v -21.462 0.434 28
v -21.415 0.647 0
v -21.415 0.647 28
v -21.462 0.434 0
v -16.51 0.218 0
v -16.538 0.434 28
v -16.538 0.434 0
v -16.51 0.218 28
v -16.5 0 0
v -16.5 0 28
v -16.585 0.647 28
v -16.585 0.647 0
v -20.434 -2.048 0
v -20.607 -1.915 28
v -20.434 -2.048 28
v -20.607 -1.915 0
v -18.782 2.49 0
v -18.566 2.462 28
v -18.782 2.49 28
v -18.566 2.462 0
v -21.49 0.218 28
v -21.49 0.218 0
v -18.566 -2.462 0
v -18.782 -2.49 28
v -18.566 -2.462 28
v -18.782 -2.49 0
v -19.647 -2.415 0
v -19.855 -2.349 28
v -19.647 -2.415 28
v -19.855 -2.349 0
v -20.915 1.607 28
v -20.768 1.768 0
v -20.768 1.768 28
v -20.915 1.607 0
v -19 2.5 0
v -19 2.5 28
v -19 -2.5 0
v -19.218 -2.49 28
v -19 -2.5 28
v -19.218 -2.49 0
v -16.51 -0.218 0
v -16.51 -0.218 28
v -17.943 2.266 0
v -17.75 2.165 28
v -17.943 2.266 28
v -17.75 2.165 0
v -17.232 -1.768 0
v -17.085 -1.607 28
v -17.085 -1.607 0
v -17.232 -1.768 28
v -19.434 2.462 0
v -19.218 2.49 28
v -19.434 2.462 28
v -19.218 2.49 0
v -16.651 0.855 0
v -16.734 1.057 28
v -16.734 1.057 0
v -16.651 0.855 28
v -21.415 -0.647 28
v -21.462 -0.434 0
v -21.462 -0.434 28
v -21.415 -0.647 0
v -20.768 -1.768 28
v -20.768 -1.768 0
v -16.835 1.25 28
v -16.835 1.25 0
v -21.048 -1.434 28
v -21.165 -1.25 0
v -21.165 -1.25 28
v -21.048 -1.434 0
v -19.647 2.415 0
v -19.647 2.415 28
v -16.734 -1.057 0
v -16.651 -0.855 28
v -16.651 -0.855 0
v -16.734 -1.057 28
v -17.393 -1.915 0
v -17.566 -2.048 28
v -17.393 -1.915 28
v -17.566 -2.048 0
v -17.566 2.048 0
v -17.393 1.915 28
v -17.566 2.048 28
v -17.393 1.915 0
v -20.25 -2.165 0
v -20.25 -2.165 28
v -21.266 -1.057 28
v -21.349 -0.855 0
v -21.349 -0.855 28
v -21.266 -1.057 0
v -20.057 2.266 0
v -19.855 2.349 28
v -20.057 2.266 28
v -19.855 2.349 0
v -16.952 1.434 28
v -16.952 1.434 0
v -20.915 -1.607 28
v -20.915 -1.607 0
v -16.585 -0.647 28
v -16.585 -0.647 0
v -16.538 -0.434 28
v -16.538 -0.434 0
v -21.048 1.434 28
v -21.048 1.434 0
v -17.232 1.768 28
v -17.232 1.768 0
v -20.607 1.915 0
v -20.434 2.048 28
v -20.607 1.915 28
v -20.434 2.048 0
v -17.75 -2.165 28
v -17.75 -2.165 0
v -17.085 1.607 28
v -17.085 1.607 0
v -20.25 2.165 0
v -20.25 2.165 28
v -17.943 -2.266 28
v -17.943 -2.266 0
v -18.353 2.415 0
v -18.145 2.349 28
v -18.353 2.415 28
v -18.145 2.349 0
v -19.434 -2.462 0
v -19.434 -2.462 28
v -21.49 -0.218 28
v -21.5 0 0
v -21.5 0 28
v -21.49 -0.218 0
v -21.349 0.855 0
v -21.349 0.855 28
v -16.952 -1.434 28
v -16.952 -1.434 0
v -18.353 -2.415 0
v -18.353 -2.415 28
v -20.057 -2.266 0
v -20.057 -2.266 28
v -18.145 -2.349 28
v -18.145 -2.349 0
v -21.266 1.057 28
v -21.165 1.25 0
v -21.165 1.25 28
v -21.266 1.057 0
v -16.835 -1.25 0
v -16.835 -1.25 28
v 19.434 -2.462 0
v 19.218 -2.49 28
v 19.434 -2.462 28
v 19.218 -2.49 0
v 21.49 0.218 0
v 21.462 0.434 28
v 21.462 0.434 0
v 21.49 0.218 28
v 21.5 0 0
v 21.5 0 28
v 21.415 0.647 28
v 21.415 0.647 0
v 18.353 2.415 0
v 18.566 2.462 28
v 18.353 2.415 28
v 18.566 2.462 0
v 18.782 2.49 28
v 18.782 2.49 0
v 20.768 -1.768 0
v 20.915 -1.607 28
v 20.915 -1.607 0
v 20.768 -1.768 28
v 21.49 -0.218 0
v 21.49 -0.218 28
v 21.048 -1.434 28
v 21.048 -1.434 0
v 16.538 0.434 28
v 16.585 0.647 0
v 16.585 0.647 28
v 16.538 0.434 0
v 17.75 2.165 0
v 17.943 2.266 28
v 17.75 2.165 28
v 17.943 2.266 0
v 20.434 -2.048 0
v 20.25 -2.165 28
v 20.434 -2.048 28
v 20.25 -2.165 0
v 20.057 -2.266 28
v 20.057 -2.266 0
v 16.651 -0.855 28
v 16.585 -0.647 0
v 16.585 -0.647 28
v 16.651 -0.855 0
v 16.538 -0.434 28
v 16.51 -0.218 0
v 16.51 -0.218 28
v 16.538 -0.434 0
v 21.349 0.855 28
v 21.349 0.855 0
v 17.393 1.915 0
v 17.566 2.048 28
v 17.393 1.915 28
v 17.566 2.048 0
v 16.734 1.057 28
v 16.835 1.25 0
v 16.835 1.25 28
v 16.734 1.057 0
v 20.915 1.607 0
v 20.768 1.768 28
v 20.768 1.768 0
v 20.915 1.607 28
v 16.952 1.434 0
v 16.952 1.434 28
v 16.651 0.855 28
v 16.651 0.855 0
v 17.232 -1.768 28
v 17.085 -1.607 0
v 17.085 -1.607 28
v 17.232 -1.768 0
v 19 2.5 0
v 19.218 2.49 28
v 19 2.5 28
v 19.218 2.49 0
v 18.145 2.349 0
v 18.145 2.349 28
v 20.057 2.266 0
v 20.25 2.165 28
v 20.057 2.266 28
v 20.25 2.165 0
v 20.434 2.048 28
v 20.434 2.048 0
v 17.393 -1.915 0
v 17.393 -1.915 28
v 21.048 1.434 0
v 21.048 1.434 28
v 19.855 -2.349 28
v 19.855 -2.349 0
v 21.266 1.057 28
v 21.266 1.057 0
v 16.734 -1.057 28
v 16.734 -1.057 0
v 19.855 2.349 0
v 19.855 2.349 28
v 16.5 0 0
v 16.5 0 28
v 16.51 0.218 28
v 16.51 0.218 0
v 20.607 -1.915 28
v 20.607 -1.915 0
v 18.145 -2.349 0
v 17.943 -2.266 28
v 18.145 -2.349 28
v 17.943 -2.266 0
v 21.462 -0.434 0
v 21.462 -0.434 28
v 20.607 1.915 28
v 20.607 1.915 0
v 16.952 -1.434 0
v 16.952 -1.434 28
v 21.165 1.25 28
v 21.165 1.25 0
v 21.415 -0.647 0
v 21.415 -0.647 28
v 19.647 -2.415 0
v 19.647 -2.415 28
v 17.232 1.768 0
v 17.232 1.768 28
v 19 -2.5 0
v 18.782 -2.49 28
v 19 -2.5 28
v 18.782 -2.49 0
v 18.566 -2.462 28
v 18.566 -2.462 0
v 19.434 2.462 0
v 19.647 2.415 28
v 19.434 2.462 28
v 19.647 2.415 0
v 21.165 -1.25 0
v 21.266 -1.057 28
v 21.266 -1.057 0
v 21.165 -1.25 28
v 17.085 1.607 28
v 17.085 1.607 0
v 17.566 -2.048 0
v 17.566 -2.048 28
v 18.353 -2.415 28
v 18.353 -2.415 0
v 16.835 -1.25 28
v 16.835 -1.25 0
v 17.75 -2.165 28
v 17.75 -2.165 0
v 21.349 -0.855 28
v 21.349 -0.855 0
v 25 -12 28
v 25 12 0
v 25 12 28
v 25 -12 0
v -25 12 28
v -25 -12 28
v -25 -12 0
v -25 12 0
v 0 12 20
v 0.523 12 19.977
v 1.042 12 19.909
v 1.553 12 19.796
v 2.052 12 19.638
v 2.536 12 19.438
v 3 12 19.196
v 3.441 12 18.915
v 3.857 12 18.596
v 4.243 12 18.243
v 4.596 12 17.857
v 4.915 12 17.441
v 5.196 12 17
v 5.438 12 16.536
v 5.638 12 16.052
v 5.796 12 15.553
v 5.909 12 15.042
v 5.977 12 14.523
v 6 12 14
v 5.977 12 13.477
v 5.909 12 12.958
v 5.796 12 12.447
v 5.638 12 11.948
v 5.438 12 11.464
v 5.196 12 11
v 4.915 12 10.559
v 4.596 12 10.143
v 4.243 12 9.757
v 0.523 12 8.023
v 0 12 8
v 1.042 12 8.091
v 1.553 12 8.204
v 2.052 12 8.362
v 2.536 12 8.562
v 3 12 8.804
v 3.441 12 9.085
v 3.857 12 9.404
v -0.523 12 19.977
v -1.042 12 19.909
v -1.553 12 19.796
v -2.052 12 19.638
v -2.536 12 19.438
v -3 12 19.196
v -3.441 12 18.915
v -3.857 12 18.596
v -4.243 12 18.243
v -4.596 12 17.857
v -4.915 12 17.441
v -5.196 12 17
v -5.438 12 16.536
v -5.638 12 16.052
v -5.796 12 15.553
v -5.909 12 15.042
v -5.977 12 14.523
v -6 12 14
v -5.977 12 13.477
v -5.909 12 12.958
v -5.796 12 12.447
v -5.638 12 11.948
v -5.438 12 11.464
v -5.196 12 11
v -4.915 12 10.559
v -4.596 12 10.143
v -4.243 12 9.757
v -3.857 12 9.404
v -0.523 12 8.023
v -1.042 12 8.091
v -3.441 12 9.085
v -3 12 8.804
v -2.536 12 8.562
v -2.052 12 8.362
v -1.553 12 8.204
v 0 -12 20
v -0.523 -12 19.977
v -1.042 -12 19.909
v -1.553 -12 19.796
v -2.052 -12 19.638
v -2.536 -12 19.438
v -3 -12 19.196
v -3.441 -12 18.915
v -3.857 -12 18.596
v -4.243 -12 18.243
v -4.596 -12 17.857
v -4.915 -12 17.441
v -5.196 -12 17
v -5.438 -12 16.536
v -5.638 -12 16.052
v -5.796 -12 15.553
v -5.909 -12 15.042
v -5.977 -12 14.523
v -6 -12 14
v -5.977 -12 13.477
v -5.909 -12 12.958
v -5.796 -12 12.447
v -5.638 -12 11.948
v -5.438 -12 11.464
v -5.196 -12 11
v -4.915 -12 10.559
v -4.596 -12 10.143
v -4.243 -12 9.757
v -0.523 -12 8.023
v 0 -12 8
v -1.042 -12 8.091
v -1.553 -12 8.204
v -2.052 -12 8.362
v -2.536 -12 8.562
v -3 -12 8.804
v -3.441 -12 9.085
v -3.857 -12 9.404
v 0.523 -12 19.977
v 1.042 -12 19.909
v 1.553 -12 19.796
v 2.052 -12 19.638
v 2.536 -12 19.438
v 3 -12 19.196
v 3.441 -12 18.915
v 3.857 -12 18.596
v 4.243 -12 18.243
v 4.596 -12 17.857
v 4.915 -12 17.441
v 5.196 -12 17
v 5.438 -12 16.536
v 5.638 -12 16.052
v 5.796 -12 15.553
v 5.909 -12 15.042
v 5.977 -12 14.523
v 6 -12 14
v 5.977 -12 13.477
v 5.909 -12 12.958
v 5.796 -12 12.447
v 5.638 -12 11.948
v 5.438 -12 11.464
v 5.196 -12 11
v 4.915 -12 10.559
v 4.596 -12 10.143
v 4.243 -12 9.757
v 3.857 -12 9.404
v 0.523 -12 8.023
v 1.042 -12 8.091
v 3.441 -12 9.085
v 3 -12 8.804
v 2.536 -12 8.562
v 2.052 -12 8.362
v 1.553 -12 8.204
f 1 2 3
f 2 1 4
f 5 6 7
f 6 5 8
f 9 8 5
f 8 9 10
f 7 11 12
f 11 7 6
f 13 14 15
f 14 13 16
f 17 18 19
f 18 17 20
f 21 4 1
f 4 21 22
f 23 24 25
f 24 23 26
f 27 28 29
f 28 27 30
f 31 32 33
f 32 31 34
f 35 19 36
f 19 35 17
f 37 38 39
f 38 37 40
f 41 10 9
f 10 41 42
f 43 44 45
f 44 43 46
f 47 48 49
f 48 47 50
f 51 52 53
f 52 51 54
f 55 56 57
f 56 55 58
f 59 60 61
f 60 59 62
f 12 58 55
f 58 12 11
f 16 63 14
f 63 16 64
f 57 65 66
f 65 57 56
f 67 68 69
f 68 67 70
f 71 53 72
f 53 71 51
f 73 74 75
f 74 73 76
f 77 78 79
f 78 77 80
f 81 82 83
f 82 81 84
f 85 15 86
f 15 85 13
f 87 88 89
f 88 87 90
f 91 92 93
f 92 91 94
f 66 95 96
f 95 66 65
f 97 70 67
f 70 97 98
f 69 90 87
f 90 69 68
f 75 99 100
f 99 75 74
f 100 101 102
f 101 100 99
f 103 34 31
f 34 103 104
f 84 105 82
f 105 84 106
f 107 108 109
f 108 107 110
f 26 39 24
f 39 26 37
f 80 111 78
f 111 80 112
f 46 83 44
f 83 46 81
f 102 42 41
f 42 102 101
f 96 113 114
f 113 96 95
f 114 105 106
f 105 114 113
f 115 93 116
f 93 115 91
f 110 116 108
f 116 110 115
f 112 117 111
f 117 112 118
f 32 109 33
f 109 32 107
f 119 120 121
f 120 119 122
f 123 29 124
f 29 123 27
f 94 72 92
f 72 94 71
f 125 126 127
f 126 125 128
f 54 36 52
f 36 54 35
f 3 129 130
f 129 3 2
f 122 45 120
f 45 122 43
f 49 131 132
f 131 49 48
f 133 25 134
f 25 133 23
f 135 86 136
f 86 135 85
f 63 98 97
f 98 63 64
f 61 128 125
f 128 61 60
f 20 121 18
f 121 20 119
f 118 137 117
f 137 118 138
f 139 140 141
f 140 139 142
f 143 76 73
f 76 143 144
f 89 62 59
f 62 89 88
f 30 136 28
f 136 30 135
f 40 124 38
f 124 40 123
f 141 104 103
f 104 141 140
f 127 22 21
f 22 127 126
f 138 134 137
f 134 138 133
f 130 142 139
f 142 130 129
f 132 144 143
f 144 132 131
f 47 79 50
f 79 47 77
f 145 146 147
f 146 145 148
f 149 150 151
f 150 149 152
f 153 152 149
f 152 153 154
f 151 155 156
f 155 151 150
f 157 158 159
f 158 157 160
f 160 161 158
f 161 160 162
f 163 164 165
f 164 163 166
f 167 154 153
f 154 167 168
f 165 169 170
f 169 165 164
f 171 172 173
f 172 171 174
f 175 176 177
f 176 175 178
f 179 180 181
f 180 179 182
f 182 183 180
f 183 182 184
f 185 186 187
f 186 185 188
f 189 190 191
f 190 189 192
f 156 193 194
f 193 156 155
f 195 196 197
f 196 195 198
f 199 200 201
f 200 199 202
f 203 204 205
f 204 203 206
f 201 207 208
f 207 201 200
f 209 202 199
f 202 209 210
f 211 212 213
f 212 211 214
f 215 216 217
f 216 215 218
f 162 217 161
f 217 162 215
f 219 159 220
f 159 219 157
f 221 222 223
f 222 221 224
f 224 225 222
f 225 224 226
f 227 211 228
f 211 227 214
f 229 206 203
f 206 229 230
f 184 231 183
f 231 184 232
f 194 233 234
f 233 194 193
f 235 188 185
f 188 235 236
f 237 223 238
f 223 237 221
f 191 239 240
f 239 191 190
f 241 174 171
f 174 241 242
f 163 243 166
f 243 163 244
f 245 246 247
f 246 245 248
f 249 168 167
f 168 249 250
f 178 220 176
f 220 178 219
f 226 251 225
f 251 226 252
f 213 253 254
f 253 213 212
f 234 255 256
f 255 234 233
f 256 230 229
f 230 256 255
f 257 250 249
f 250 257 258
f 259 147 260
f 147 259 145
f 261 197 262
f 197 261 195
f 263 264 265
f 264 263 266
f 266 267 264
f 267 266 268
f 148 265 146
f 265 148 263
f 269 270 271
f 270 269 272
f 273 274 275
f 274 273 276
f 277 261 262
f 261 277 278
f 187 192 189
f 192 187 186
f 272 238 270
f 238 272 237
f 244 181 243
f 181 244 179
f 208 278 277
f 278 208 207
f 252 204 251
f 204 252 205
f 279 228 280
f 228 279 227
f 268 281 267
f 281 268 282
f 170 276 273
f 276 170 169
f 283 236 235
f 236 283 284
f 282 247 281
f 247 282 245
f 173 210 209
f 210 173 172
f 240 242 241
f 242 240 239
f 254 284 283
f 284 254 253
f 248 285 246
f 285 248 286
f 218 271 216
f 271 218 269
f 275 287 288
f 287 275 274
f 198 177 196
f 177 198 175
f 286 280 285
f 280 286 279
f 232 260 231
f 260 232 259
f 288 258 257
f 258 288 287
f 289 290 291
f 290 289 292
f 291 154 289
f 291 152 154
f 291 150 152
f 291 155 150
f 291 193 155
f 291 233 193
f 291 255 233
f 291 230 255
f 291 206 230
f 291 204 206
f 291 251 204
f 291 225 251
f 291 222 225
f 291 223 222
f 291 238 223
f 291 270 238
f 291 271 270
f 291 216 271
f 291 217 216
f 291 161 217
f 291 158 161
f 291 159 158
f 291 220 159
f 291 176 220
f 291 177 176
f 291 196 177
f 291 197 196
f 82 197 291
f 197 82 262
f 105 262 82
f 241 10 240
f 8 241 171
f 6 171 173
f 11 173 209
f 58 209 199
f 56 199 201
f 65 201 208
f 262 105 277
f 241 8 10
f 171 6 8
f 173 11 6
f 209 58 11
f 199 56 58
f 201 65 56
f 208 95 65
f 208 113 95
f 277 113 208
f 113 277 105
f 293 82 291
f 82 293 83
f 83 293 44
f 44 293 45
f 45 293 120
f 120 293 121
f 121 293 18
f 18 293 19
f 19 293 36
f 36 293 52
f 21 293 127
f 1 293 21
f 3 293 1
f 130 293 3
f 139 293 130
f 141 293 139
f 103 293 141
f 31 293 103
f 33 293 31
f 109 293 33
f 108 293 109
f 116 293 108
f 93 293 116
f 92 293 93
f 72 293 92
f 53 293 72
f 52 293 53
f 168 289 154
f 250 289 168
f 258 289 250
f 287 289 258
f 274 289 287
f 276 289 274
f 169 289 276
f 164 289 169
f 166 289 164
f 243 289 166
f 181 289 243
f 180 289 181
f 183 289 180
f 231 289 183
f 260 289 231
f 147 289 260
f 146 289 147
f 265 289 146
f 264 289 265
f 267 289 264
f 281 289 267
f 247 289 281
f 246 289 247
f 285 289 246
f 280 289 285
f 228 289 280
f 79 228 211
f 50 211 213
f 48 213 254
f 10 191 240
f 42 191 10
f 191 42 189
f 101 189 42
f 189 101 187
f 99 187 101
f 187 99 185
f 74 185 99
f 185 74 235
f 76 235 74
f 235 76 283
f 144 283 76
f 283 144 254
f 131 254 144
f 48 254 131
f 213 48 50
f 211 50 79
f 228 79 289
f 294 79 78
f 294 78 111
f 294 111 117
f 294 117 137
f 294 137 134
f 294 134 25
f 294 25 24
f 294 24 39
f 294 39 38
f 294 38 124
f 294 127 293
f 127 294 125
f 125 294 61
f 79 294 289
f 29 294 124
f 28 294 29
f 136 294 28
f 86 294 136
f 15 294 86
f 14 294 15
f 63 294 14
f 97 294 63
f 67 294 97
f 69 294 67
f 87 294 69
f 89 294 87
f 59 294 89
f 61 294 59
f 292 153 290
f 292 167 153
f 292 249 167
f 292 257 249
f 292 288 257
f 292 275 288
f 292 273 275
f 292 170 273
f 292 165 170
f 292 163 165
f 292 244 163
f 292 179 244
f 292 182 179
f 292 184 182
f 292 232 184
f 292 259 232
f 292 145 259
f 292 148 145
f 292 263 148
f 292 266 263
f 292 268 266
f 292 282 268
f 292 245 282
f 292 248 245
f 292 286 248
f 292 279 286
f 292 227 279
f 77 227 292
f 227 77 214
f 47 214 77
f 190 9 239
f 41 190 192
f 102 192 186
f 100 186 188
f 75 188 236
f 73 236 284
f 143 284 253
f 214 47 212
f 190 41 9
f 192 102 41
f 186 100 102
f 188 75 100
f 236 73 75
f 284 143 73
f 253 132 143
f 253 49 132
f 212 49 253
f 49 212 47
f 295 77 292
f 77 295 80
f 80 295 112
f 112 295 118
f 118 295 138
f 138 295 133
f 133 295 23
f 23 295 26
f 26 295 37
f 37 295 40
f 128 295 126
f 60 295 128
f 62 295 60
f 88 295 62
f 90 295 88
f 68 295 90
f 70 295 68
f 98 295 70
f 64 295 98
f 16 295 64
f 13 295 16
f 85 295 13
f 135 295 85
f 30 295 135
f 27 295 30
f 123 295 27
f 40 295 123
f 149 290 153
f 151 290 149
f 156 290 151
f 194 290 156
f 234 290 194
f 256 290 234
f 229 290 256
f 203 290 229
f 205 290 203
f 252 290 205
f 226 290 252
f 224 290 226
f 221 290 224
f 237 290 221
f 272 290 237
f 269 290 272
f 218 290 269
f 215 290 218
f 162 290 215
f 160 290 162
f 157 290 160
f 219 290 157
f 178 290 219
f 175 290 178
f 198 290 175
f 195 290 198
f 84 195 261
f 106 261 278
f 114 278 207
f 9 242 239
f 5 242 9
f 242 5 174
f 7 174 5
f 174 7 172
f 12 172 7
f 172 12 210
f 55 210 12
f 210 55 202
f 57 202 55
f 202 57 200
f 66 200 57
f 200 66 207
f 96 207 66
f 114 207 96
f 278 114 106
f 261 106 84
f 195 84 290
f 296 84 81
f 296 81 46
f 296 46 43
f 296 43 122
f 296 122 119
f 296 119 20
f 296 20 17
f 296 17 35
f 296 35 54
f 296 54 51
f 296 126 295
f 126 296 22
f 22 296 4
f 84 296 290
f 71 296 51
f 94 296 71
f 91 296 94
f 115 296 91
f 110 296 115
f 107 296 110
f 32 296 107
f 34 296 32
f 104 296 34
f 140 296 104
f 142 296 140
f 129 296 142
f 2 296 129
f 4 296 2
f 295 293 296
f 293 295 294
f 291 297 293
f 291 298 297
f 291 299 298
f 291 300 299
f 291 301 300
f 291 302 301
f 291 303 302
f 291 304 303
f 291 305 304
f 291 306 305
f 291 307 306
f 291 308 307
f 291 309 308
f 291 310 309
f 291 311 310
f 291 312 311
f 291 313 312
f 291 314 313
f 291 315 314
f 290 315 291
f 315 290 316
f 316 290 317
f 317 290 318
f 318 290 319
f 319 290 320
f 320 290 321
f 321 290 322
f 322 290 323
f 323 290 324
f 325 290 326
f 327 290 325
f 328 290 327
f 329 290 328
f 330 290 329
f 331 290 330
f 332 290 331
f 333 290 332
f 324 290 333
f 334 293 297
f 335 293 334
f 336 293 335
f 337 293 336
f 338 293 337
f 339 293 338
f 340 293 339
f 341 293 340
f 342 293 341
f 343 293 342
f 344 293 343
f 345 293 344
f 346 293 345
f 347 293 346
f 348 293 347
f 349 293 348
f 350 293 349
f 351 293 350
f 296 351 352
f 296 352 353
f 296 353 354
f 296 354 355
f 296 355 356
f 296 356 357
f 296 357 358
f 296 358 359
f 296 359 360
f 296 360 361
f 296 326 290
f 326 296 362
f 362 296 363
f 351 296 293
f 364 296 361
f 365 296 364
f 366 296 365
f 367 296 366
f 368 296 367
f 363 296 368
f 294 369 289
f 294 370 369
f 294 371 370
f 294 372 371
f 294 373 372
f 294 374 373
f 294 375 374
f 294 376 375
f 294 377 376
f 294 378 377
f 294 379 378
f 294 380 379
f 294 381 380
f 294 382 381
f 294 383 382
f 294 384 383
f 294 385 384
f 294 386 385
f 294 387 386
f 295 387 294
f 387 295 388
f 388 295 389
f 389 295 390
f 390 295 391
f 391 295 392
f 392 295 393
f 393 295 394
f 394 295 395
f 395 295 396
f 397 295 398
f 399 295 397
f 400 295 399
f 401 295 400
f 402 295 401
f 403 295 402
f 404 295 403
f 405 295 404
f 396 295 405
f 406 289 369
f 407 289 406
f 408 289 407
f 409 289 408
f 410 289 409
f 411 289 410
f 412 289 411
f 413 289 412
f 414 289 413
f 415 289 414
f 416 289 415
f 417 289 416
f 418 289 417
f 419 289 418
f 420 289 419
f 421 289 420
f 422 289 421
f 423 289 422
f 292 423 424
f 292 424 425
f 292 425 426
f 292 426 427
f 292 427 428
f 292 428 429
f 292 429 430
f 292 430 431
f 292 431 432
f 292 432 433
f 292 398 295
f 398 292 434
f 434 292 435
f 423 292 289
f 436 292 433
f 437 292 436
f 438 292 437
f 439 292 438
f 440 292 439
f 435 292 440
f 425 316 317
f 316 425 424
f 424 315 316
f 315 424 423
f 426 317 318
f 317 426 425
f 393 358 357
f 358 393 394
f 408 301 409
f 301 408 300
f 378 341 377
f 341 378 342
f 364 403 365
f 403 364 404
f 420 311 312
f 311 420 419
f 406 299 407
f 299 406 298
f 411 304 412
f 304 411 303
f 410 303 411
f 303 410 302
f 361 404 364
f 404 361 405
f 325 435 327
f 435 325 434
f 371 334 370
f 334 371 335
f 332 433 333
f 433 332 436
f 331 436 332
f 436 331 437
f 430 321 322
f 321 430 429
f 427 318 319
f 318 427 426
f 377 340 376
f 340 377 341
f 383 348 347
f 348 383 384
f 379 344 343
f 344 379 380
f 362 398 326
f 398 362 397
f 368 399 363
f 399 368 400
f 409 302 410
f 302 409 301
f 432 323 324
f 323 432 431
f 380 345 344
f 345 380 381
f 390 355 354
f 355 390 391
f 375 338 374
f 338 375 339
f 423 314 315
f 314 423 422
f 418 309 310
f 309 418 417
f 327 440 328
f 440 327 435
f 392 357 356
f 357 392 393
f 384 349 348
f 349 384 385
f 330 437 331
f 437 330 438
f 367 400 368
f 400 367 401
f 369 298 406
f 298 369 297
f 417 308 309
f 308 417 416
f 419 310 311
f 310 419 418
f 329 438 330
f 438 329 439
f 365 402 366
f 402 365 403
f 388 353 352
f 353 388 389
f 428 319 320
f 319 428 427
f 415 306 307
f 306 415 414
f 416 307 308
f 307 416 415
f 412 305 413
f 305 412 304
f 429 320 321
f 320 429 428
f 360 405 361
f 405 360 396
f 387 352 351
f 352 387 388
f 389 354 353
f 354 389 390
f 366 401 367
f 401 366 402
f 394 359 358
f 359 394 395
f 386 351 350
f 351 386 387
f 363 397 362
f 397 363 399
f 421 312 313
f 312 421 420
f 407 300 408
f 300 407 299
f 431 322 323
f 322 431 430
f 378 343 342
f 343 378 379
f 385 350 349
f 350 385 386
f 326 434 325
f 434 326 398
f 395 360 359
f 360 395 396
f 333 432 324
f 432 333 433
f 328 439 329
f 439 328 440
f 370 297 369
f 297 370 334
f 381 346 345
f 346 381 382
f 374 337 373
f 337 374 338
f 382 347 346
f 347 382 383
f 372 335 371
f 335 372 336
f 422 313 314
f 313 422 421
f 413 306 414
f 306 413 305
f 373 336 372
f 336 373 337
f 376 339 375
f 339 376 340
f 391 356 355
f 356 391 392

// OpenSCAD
// Pillow block - a bench block that supports a horizontal shaft through a bore, bolted down
// at each end. NOVEL general mechanical mount.
//
// @desc pillow block that supports a horizontal shaft through a bore
// @prompt Design a pillow block in OpenSCAD: a block {bw} mm wide and {bl} mm deep carrying a horizontal {bore} mm bore at mid height, with a {bolt} mm bolt hole near each end to fix it to a surface. Reply with a single complete OpenSCAD file.
// @param bore  shaft bore diameter, mm   [6:24]
// @param bw    block width, mm           [40:90]
// @param bl    block depth, mm           [18:50]
// @param bolt  bolt hole diameter, mm    [3:8]

bore = 12;
bw   = 50;
bl   = 24;
bolt = 5;

$fn = 72;

H = bore + 16;                 // height so the bore has wall above and below

difference() {
    translate([-bw / 2, -bl / 2, 0]) cube([bw, bl, H]);
    translate([0, -bl / 2 - 1, H / 2]) rotate([-90, 0, 0]) cylinder(h = bl + 2, d = bore);   // horizontal bore
    for (x = [-bw * 0.38, bw * 0.38])
        translate([x, 0, -1]) cylinder(h = H + 2, d = bolt);                                 // bolt holes
}
